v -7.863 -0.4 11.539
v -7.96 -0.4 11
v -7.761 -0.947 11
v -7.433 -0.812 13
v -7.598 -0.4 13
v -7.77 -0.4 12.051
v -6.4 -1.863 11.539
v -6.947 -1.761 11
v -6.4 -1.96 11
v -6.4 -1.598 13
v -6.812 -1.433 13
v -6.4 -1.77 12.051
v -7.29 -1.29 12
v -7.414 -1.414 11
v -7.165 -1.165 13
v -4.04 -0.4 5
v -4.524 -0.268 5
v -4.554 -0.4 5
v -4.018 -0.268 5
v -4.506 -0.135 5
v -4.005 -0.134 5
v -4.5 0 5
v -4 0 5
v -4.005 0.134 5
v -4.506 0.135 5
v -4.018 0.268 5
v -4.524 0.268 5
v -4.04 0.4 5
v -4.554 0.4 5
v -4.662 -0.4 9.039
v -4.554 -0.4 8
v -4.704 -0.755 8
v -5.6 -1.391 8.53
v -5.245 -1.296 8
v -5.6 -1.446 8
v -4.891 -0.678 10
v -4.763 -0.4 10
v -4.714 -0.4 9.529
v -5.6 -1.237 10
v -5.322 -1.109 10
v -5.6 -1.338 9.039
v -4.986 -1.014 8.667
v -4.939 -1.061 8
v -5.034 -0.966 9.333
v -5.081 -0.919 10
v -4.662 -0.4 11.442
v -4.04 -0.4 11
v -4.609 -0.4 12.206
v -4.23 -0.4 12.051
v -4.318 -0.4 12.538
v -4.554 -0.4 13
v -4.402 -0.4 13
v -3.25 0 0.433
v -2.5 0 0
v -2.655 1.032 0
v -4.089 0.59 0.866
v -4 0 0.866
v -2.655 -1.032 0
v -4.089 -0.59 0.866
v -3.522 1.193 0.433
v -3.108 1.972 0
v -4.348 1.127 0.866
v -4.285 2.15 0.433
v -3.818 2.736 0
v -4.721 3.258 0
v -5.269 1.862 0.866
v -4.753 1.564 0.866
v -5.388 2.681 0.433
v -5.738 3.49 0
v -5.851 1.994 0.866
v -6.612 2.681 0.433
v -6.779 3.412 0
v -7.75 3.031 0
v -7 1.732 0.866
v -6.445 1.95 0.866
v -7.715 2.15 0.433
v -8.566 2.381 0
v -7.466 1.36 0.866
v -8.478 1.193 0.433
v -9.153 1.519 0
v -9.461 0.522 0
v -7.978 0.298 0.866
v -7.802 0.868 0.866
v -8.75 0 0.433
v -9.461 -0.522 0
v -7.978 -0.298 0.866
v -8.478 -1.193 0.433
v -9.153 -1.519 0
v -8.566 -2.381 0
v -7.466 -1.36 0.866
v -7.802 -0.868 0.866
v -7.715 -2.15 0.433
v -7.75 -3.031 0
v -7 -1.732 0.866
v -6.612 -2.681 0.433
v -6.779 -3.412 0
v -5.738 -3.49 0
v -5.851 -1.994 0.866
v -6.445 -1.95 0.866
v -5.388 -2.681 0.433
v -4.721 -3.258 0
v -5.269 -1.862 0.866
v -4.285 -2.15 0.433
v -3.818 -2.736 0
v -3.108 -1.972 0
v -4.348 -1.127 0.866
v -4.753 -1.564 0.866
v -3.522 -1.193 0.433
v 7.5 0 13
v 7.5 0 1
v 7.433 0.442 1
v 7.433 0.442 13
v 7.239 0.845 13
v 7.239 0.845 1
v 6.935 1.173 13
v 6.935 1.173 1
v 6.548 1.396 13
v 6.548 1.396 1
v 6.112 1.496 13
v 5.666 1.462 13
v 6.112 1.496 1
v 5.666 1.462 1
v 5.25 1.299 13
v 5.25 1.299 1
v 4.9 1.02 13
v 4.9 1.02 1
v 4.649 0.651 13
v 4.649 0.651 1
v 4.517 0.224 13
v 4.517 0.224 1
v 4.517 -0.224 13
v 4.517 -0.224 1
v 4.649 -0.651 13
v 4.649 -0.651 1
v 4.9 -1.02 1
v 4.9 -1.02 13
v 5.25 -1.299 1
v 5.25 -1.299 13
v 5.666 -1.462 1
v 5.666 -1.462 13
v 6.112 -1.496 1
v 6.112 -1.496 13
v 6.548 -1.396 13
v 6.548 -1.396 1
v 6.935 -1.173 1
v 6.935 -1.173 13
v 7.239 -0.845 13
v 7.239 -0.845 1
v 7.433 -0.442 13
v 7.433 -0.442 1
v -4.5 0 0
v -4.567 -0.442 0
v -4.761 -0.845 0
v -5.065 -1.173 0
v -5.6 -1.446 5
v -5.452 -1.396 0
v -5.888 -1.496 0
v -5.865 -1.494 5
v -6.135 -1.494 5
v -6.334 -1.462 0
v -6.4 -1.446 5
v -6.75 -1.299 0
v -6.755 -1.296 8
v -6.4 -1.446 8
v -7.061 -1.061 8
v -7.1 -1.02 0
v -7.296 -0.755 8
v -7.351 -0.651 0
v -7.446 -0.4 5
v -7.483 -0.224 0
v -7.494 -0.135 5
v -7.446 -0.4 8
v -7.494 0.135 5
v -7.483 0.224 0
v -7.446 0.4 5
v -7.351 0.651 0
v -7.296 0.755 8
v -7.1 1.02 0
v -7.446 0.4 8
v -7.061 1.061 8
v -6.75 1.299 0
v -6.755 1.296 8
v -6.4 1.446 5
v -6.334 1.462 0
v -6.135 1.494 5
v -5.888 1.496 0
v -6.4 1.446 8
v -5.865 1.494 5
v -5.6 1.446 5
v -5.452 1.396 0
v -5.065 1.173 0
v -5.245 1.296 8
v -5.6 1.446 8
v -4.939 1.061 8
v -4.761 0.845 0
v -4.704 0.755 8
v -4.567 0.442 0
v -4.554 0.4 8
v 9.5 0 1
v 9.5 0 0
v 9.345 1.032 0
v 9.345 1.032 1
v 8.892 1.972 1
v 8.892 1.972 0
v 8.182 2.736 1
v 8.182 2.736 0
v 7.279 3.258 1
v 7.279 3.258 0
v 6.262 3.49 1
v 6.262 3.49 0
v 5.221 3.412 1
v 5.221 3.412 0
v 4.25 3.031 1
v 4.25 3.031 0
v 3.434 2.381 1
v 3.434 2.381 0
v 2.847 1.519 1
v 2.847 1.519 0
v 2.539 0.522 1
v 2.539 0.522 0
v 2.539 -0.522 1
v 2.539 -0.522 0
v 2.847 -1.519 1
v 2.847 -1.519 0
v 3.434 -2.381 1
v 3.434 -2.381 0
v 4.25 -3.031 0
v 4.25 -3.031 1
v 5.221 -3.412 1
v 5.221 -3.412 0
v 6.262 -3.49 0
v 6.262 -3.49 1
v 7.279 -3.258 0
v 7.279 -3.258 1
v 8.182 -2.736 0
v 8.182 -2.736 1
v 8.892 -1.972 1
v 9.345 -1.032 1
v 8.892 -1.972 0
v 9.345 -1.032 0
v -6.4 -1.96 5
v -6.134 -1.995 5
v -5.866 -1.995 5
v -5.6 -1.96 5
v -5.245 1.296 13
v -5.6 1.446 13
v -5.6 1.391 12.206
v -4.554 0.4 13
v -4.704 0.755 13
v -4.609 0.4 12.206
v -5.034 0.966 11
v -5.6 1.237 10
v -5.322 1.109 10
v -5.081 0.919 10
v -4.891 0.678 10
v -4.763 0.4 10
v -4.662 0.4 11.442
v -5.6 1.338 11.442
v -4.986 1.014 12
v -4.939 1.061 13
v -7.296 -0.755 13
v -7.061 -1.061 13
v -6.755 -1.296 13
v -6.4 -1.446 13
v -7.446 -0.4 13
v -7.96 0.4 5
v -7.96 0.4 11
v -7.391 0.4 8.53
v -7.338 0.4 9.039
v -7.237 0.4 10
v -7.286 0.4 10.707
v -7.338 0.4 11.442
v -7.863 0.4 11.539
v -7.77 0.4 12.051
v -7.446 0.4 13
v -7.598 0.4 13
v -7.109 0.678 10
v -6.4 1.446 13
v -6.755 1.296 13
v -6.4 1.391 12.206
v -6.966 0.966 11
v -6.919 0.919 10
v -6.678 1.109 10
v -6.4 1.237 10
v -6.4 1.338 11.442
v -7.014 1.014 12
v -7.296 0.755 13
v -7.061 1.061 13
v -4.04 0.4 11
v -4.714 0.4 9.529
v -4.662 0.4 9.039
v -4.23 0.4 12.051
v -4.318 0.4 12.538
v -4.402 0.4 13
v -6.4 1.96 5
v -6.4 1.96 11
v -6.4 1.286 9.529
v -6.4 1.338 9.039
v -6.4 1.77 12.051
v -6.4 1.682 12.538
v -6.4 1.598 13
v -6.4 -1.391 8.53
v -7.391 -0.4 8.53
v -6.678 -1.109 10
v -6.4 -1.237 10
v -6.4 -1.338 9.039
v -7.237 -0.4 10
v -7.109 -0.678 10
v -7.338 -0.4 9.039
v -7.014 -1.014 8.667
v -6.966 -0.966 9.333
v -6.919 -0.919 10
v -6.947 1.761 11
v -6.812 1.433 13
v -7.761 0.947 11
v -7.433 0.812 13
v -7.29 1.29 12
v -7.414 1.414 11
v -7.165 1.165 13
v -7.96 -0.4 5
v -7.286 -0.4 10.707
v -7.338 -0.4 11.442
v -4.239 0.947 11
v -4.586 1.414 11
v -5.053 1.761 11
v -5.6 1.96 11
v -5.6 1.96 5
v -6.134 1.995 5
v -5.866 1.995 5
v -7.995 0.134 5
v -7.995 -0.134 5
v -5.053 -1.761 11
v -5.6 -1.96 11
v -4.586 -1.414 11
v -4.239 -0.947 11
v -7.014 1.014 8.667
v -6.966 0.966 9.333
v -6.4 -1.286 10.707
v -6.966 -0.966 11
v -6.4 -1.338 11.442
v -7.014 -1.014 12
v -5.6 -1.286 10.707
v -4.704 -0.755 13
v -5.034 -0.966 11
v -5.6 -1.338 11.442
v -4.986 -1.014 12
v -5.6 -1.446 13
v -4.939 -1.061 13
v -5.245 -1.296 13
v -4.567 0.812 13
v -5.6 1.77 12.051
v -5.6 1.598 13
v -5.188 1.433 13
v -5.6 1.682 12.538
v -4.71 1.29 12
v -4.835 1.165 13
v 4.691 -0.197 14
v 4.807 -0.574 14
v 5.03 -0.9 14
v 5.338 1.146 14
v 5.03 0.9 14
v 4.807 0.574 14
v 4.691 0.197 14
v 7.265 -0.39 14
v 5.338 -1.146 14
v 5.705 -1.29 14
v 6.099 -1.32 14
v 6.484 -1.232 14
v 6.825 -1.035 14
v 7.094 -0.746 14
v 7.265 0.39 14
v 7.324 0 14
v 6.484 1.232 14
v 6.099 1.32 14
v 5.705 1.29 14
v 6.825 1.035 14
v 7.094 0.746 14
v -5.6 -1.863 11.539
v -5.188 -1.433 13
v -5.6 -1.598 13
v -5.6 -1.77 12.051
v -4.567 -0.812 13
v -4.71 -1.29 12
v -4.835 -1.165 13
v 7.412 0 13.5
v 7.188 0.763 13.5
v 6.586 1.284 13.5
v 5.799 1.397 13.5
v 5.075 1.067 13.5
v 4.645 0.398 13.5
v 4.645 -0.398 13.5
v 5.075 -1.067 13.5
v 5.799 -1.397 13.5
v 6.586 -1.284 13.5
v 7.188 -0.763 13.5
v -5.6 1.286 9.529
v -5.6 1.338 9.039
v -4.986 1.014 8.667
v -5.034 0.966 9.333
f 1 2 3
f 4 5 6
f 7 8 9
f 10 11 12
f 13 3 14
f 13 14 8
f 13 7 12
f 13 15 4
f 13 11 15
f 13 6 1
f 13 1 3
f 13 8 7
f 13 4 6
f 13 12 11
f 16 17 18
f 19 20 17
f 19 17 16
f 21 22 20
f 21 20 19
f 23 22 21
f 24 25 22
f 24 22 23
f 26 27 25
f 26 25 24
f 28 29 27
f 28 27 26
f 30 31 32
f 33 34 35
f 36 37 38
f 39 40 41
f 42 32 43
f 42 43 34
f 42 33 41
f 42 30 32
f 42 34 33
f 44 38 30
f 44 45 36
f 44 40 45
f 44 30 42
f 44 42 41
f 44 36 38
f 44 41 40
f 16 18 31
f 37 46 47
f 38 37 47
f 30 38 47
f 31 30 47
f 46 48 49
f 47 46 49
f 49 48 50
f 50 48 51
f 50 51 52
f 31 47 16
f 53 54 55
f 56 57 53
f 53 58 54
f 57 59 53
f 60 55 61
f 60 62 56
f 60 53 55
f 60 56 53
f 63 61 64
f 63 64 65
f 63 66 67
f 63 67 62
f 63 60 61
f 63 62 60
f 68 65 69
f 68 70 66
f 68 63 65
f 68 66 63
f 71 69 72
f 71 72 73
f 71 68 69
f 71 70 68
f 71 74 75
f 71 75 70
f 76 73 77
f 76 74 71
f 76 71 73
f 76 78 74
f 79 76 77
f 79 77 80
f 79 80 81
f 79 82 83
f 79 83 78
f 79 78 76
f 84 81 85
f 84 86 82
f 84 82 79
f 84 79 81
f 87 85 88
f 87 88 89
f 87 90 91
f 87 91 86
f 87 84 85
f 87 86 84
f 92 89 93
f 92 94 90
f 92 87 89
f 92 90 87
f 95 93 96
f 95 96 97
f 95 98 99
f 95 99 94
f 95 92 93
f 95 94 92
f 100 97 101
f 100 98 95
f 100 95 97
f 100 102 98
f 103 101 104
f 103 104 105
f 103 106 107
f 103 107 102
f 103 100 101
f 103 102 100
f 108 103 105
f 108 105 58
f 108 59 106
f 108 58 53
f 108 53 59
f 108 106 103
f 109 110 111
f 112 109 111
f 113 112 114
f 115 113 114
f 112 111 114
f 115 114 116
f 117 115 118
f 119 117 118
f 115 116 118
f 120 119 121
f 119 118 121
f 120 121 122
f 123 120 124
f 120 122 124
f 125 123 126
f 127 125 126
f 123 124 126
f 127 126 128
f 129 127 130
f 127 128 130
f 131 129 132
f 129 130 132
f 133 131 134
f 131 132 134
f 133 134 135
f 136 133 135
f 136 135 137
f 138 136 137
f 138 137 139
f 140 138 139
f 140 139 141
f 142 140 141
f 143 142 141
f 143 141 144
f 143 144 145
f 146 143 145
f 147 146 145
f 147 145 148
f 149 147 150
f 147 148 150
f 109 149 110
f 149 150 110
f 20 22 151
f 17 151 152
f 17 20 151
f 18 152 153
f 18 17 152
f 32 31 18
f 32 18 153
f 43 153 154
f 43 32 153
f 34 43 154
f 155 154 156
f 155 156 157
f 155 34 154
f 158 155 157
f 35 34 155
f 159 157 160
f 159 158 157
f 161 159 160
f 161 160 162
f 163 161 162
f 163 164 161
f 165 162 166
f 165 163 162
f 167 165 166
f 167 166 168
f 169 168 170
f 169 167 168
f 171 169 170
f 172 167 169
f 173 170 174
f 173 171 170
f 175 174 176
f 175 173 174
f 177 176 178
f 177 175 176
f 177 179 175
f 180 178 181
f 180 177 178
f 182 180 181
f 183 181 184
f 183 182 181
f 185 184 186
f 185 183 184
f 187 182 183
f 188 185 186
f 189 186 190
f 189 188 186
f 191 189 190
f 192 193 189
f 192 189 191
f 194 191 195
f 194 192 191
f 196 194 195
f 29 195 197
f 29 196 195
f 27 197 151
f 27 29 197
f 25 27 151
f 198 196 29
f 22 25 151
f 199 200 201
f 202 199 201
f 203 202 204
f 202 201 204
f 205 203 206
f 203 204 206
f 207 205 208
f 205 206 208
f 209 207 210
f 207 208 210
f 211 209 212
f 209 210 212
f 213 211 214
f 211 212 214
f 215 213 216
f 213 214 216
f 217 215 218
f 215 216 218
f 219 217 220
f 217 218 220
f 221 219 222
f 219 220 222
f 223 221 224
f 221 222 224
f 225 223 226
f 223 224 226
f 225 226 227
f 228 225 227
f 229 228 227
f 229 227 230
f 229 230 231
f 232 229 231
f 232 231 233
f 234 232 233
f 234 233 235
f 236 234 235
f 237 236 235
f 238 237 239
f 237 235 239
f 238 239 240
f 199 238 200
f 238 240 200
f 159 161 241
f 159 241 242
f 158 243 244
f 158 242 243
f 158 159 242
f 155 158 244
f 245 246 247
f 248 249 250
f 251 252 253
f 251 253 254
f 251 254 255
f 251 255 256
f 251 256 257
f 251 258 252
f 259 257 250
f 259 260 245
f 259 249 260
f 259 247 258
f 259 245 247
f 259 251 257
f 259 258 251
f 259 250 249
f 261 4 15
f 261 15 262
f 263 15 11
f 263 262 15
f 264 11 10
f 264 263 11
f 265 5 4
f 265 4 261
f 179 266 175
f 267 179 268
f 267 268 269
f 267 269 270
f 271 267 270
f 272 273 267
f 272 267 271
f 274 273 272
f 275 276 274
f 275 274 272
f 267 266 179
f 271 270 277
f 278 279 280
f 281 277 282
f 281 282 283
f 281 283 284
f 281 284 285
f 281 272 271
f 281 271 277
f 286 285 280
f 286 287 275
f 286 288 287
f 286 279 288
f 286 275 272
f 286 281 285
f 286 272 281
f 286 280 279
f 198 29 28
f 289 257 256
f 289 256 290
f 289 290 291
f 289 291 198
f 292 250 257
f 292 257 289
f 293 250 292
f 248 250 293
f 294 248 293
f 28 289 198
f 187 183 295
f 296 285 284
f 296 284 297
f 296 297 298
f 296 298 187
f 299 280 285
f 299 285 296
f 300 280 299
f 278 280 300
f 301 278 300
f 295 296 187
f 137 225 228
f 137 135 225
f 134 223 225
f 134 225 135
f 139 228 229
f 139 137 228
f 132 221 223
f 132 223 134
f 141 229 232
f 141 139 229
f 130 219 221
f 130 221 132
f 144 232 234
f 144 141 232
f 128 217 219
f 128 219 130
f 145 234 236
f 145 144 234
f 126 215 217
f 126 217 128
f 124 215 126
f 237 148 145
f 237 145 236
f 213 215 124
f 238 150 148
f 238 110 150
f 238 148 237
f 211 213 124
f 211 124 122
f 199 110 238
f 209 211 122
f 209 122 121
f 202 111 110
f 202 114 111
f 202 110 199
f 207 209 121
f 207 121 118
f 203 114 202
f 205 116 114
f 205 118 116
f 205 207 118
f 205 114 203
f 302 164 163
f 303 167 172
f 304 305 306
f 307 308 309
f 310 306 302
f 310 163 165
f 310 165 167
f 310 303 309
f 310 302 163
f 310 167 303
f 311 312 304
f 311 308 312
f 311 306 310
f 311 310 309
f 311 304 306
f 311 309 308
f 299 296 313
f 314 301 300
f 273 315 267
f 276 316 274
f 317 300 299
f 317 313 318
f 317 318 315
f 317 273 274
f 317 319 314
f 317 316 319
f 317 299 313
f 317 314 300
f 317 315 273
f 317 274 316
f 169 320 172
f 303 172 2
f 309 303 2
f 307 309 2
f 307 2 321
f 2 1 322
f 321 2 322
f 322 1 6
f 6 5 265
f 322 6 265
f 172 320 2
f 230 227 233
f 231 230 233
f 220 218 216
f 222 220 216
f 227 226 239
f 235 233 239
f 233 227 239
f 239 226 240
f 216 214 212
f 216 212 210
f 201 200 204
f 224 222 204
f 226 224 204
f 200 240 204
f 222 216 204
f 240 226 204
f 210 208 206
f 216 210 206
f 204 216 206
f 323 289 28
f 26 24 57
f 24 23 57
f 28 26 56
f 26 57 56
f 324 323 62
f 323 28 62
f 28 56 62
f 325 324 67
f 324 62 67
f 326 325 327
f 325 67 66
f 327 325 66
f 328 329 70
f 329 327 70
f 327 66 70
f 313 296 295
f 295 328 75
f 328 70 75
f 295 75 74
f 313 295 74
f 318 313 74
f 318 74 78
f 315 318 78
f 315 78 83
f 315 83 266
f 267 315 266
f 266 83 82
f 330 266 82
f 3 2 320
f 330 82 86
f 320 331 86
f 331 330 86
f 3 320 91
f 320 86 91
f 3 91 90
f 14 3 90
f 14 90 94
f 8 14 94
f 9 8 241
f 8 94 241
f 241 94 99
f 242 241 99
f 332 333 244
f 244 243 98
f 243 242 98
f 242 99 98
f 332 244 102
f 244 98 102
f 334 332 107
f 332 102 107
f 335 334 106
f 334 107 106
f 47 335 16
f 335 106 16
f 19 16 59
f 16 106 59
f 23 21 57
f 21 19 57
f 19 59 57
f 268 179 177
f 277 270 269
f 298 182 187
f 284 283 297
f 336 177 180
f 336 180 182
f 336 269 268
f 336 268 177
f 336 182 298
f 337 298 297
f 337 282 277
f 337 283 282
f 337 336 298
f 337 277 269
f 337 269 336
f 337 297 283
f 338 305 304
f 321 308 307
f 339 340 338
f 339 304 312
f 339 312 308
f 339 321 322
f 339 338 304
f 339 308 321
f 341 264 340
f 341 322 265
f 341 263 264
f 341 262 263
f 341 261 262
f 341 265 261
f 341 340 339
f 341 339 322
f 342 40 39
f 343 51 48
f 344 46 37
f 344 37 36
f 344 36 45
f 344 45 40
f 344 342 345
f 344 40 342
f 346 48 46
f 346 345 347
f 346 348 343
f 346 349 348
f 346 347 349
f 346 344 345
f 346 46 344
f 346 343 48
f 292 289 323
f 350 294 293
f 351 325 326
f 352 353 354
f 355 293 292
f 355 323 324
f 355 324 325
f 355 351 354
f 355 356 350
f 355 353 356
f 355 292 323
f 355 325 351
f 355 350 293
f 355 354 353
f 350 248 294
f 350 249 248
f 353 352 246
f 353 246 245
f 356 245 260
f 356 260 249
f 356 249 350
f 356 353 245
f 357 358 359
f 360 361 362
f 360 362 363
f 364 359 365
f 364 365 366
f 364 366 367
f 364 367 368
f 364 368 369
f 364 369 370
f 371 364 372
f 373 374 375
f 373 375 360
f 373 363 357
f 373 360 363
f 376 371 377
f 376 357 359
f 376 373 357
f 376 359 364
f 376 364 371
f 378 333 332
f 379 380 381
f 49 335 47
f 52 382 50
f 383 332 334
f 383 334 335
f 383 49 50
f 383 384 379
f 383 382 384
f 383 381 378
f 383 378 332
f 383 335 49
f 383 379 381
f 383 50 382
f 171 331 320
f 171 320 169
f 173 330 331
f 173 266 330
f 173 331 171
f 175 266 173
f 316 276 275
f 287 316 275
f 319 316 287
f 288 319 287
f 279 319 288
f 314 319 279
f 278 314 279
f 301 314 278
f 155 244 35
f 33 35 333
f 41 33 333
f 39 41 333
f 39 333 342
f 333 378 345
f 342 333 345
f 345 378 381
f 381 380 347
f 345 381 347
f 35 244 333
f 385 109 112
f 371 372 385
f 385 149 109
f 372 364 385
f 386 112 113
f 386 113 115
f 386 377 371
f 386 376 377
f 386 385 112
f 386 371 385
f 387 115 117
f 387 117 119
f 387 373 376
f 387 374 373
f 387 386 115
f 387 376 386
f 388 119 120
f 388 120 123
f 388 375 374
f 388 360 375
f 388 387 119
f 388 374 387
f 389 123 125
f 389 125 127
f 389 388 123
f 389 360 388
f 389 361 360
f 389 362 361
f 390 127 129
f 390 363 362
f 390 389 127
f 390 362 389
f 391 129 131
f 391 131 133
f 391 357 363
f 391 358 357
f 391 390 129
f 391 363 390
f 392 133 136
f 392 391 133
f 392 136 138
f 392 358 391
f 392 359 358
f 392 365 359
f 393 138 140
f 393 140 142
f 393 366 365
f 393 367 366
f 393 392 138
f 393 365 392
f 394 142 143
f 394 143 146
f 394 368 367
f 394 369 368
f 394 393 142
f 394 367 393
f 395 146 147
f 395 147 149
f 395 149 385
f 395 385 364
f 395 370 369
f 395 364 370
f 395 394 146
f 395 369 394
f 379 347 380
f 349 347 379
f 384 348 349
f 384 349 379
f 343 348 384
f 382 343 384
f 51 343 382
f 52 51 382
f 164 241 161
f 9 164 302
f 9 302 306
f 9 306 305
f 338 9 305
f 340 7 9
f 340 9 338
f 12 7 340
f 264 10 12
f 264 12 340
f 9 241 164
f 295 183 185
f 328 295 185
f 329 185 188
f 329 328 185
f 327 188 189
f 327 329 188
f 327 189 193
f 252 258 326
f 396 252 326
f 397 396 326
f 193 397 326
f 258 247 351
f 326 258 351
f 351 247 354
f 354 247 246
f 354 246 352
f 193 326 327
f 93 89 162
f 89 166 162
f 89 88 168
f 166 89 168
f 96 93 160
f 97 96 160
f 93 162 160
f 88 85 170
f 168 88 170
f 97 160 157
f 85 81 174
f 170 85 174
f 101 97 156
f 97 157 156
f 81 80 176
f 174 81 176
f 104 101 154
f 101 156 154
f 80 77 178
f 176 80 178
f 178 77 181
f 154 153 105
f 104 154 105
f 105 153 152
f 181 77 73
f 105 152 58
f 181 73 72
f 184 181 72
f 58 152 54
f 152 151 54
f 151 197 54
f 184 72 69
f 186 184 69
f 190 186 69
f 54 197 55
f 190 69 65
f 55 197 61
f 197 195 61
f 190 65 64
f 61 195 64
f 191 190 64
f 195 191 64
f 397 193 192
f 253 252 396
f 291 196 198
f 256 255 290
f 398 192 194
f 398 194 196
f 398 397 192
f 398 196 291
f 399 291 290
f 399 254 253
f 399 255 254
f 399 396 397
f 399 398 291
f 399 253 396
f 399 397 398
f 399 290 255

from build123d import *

# Parameters (mm, degrees)
F0_R      = 3.5
F1_DEPTH  = 1
F2_SIZE2  = 1.732041
F2_SIZE   = 0.99999
F3_R      = 2
F4_DEPTH  = 13
F5_SIZE2  = 0.3526539614
F5_SIZE   = 2
F8_R      = 1.5
F9_DEPTH  = 13
F10_SIZE2 = 0.1763269807
F10_SIZE  = 1
F11_W     = 2.1
F11_H     = 0.8
F11_W_2   = 0.8
F11_H_2   = 2.1
F12_DEPTH = 8


# Not quite as in the source:
# - a fillet or chamfer is up to 0.001 mm smaller than in the source, because OpenCascade refuses the exact size


with BuildPart() as f1:
    # F0 (on Top) → F1 (new body)
    with BuildSketch(Plane.XY):
        with Locations((-6, 0)):
            Circle(F0_R)
    extrude(amount=F1_DEPTH)

    # F2 (size 1 and 1.7320508076 in the source; OpenCascade refuses exactly that, so slightly less here)
    f2_edges = [f1.edges().sort_by_distance(p)[0] for p in [
        (-9.5, 0, 1),
    ]]
    f2_side = f1.faces().sort_by_distance((-9.5, 0, 0.5))[0]
    chamfer(f2_edges, length=F2_SIZE, length2=F2_SIZE2, reference=f2_side)

    # F3 (on Top) → F4 (join)
    with BuildSketch(Plane.XY):
        with Locations((-6, 0)):
            Circle(F3_R)
    extrude(amount=F4_DEPTH)

    # F5
    f5_edges = [f1.edges().sort_by_distance(p)[0] for p in [
        (-8, 0, 13),
    ]]
    f5_side = f1.faces().sort_by_distance((-8, 0, 6.933016))[0]
    chamfer(f5_edges, length=F5_SIZE, length2=F5_SIZE2, reference=f5_side)

    # F6 (on Front) → F7 (revolve, cut)
    with BuildSketch(Plane.XZ):
        Polygon((-4.5, 13), (-6, 13), (-6, 0), (-4.5, 0), (-4.5, 8), (-4.7, 10), align=None)
    revolve(axis=Axis((-6, 0, 6.5), (0, 0, -1)), mode=Mode.SUBTRACT)

    # F11 (on face) → F12 (cut)
    with BuildSketch(Plane.XY.offset(13)):
        with Locations((-7.45, 0)):
            Rectangle(F11_W, F11_H)
        with Locations((-6, 1.45)):
            Rectangle(F11_W_2, F11_H_2)
        with Locations((-6, 0)):
            Rectangle(F11_W_2, F11_H)
        with Locations((-4.55, 0)):
            Rectangle(F11_W, F11_H)
        with Locations((-6, -1.45)):
            Rectangle(F11_W_2, F11_H_2)
    extrude(amount=-F12_DEPTH, mode=Mode.SUBTRACT)


with BuildPart() as f1b:
    # F0 (on Top) → F1, piece 2 (new body)
    with BuildSketch(Plane.XY):
        with Locations((6, 0)):
            Circle(F0_R)
    extrude(amount=F1_DEPTH)

    # F8 (on face) → F9 (join)
    with BuildSketch(Plane.XY.offset(1)):
        with Locations((6, 0)):
            Circle(F8_R)
    extrude(amount=F9_DEPTH)

    # F10
    f10_edges = [f1b.edges().sort_by_distance(p)[0] for p in [
        (4.5, 0, 14),
    ]]
    f10_side = f1b.faces().sort_by_distance((4.5, 0, 7.5))[0]
    chamfer(f10_edges, length=F10_SIZE, length2=F10_SIZE2, reference=f10_side)


solid = Compound([f1.part, f1b.part])
